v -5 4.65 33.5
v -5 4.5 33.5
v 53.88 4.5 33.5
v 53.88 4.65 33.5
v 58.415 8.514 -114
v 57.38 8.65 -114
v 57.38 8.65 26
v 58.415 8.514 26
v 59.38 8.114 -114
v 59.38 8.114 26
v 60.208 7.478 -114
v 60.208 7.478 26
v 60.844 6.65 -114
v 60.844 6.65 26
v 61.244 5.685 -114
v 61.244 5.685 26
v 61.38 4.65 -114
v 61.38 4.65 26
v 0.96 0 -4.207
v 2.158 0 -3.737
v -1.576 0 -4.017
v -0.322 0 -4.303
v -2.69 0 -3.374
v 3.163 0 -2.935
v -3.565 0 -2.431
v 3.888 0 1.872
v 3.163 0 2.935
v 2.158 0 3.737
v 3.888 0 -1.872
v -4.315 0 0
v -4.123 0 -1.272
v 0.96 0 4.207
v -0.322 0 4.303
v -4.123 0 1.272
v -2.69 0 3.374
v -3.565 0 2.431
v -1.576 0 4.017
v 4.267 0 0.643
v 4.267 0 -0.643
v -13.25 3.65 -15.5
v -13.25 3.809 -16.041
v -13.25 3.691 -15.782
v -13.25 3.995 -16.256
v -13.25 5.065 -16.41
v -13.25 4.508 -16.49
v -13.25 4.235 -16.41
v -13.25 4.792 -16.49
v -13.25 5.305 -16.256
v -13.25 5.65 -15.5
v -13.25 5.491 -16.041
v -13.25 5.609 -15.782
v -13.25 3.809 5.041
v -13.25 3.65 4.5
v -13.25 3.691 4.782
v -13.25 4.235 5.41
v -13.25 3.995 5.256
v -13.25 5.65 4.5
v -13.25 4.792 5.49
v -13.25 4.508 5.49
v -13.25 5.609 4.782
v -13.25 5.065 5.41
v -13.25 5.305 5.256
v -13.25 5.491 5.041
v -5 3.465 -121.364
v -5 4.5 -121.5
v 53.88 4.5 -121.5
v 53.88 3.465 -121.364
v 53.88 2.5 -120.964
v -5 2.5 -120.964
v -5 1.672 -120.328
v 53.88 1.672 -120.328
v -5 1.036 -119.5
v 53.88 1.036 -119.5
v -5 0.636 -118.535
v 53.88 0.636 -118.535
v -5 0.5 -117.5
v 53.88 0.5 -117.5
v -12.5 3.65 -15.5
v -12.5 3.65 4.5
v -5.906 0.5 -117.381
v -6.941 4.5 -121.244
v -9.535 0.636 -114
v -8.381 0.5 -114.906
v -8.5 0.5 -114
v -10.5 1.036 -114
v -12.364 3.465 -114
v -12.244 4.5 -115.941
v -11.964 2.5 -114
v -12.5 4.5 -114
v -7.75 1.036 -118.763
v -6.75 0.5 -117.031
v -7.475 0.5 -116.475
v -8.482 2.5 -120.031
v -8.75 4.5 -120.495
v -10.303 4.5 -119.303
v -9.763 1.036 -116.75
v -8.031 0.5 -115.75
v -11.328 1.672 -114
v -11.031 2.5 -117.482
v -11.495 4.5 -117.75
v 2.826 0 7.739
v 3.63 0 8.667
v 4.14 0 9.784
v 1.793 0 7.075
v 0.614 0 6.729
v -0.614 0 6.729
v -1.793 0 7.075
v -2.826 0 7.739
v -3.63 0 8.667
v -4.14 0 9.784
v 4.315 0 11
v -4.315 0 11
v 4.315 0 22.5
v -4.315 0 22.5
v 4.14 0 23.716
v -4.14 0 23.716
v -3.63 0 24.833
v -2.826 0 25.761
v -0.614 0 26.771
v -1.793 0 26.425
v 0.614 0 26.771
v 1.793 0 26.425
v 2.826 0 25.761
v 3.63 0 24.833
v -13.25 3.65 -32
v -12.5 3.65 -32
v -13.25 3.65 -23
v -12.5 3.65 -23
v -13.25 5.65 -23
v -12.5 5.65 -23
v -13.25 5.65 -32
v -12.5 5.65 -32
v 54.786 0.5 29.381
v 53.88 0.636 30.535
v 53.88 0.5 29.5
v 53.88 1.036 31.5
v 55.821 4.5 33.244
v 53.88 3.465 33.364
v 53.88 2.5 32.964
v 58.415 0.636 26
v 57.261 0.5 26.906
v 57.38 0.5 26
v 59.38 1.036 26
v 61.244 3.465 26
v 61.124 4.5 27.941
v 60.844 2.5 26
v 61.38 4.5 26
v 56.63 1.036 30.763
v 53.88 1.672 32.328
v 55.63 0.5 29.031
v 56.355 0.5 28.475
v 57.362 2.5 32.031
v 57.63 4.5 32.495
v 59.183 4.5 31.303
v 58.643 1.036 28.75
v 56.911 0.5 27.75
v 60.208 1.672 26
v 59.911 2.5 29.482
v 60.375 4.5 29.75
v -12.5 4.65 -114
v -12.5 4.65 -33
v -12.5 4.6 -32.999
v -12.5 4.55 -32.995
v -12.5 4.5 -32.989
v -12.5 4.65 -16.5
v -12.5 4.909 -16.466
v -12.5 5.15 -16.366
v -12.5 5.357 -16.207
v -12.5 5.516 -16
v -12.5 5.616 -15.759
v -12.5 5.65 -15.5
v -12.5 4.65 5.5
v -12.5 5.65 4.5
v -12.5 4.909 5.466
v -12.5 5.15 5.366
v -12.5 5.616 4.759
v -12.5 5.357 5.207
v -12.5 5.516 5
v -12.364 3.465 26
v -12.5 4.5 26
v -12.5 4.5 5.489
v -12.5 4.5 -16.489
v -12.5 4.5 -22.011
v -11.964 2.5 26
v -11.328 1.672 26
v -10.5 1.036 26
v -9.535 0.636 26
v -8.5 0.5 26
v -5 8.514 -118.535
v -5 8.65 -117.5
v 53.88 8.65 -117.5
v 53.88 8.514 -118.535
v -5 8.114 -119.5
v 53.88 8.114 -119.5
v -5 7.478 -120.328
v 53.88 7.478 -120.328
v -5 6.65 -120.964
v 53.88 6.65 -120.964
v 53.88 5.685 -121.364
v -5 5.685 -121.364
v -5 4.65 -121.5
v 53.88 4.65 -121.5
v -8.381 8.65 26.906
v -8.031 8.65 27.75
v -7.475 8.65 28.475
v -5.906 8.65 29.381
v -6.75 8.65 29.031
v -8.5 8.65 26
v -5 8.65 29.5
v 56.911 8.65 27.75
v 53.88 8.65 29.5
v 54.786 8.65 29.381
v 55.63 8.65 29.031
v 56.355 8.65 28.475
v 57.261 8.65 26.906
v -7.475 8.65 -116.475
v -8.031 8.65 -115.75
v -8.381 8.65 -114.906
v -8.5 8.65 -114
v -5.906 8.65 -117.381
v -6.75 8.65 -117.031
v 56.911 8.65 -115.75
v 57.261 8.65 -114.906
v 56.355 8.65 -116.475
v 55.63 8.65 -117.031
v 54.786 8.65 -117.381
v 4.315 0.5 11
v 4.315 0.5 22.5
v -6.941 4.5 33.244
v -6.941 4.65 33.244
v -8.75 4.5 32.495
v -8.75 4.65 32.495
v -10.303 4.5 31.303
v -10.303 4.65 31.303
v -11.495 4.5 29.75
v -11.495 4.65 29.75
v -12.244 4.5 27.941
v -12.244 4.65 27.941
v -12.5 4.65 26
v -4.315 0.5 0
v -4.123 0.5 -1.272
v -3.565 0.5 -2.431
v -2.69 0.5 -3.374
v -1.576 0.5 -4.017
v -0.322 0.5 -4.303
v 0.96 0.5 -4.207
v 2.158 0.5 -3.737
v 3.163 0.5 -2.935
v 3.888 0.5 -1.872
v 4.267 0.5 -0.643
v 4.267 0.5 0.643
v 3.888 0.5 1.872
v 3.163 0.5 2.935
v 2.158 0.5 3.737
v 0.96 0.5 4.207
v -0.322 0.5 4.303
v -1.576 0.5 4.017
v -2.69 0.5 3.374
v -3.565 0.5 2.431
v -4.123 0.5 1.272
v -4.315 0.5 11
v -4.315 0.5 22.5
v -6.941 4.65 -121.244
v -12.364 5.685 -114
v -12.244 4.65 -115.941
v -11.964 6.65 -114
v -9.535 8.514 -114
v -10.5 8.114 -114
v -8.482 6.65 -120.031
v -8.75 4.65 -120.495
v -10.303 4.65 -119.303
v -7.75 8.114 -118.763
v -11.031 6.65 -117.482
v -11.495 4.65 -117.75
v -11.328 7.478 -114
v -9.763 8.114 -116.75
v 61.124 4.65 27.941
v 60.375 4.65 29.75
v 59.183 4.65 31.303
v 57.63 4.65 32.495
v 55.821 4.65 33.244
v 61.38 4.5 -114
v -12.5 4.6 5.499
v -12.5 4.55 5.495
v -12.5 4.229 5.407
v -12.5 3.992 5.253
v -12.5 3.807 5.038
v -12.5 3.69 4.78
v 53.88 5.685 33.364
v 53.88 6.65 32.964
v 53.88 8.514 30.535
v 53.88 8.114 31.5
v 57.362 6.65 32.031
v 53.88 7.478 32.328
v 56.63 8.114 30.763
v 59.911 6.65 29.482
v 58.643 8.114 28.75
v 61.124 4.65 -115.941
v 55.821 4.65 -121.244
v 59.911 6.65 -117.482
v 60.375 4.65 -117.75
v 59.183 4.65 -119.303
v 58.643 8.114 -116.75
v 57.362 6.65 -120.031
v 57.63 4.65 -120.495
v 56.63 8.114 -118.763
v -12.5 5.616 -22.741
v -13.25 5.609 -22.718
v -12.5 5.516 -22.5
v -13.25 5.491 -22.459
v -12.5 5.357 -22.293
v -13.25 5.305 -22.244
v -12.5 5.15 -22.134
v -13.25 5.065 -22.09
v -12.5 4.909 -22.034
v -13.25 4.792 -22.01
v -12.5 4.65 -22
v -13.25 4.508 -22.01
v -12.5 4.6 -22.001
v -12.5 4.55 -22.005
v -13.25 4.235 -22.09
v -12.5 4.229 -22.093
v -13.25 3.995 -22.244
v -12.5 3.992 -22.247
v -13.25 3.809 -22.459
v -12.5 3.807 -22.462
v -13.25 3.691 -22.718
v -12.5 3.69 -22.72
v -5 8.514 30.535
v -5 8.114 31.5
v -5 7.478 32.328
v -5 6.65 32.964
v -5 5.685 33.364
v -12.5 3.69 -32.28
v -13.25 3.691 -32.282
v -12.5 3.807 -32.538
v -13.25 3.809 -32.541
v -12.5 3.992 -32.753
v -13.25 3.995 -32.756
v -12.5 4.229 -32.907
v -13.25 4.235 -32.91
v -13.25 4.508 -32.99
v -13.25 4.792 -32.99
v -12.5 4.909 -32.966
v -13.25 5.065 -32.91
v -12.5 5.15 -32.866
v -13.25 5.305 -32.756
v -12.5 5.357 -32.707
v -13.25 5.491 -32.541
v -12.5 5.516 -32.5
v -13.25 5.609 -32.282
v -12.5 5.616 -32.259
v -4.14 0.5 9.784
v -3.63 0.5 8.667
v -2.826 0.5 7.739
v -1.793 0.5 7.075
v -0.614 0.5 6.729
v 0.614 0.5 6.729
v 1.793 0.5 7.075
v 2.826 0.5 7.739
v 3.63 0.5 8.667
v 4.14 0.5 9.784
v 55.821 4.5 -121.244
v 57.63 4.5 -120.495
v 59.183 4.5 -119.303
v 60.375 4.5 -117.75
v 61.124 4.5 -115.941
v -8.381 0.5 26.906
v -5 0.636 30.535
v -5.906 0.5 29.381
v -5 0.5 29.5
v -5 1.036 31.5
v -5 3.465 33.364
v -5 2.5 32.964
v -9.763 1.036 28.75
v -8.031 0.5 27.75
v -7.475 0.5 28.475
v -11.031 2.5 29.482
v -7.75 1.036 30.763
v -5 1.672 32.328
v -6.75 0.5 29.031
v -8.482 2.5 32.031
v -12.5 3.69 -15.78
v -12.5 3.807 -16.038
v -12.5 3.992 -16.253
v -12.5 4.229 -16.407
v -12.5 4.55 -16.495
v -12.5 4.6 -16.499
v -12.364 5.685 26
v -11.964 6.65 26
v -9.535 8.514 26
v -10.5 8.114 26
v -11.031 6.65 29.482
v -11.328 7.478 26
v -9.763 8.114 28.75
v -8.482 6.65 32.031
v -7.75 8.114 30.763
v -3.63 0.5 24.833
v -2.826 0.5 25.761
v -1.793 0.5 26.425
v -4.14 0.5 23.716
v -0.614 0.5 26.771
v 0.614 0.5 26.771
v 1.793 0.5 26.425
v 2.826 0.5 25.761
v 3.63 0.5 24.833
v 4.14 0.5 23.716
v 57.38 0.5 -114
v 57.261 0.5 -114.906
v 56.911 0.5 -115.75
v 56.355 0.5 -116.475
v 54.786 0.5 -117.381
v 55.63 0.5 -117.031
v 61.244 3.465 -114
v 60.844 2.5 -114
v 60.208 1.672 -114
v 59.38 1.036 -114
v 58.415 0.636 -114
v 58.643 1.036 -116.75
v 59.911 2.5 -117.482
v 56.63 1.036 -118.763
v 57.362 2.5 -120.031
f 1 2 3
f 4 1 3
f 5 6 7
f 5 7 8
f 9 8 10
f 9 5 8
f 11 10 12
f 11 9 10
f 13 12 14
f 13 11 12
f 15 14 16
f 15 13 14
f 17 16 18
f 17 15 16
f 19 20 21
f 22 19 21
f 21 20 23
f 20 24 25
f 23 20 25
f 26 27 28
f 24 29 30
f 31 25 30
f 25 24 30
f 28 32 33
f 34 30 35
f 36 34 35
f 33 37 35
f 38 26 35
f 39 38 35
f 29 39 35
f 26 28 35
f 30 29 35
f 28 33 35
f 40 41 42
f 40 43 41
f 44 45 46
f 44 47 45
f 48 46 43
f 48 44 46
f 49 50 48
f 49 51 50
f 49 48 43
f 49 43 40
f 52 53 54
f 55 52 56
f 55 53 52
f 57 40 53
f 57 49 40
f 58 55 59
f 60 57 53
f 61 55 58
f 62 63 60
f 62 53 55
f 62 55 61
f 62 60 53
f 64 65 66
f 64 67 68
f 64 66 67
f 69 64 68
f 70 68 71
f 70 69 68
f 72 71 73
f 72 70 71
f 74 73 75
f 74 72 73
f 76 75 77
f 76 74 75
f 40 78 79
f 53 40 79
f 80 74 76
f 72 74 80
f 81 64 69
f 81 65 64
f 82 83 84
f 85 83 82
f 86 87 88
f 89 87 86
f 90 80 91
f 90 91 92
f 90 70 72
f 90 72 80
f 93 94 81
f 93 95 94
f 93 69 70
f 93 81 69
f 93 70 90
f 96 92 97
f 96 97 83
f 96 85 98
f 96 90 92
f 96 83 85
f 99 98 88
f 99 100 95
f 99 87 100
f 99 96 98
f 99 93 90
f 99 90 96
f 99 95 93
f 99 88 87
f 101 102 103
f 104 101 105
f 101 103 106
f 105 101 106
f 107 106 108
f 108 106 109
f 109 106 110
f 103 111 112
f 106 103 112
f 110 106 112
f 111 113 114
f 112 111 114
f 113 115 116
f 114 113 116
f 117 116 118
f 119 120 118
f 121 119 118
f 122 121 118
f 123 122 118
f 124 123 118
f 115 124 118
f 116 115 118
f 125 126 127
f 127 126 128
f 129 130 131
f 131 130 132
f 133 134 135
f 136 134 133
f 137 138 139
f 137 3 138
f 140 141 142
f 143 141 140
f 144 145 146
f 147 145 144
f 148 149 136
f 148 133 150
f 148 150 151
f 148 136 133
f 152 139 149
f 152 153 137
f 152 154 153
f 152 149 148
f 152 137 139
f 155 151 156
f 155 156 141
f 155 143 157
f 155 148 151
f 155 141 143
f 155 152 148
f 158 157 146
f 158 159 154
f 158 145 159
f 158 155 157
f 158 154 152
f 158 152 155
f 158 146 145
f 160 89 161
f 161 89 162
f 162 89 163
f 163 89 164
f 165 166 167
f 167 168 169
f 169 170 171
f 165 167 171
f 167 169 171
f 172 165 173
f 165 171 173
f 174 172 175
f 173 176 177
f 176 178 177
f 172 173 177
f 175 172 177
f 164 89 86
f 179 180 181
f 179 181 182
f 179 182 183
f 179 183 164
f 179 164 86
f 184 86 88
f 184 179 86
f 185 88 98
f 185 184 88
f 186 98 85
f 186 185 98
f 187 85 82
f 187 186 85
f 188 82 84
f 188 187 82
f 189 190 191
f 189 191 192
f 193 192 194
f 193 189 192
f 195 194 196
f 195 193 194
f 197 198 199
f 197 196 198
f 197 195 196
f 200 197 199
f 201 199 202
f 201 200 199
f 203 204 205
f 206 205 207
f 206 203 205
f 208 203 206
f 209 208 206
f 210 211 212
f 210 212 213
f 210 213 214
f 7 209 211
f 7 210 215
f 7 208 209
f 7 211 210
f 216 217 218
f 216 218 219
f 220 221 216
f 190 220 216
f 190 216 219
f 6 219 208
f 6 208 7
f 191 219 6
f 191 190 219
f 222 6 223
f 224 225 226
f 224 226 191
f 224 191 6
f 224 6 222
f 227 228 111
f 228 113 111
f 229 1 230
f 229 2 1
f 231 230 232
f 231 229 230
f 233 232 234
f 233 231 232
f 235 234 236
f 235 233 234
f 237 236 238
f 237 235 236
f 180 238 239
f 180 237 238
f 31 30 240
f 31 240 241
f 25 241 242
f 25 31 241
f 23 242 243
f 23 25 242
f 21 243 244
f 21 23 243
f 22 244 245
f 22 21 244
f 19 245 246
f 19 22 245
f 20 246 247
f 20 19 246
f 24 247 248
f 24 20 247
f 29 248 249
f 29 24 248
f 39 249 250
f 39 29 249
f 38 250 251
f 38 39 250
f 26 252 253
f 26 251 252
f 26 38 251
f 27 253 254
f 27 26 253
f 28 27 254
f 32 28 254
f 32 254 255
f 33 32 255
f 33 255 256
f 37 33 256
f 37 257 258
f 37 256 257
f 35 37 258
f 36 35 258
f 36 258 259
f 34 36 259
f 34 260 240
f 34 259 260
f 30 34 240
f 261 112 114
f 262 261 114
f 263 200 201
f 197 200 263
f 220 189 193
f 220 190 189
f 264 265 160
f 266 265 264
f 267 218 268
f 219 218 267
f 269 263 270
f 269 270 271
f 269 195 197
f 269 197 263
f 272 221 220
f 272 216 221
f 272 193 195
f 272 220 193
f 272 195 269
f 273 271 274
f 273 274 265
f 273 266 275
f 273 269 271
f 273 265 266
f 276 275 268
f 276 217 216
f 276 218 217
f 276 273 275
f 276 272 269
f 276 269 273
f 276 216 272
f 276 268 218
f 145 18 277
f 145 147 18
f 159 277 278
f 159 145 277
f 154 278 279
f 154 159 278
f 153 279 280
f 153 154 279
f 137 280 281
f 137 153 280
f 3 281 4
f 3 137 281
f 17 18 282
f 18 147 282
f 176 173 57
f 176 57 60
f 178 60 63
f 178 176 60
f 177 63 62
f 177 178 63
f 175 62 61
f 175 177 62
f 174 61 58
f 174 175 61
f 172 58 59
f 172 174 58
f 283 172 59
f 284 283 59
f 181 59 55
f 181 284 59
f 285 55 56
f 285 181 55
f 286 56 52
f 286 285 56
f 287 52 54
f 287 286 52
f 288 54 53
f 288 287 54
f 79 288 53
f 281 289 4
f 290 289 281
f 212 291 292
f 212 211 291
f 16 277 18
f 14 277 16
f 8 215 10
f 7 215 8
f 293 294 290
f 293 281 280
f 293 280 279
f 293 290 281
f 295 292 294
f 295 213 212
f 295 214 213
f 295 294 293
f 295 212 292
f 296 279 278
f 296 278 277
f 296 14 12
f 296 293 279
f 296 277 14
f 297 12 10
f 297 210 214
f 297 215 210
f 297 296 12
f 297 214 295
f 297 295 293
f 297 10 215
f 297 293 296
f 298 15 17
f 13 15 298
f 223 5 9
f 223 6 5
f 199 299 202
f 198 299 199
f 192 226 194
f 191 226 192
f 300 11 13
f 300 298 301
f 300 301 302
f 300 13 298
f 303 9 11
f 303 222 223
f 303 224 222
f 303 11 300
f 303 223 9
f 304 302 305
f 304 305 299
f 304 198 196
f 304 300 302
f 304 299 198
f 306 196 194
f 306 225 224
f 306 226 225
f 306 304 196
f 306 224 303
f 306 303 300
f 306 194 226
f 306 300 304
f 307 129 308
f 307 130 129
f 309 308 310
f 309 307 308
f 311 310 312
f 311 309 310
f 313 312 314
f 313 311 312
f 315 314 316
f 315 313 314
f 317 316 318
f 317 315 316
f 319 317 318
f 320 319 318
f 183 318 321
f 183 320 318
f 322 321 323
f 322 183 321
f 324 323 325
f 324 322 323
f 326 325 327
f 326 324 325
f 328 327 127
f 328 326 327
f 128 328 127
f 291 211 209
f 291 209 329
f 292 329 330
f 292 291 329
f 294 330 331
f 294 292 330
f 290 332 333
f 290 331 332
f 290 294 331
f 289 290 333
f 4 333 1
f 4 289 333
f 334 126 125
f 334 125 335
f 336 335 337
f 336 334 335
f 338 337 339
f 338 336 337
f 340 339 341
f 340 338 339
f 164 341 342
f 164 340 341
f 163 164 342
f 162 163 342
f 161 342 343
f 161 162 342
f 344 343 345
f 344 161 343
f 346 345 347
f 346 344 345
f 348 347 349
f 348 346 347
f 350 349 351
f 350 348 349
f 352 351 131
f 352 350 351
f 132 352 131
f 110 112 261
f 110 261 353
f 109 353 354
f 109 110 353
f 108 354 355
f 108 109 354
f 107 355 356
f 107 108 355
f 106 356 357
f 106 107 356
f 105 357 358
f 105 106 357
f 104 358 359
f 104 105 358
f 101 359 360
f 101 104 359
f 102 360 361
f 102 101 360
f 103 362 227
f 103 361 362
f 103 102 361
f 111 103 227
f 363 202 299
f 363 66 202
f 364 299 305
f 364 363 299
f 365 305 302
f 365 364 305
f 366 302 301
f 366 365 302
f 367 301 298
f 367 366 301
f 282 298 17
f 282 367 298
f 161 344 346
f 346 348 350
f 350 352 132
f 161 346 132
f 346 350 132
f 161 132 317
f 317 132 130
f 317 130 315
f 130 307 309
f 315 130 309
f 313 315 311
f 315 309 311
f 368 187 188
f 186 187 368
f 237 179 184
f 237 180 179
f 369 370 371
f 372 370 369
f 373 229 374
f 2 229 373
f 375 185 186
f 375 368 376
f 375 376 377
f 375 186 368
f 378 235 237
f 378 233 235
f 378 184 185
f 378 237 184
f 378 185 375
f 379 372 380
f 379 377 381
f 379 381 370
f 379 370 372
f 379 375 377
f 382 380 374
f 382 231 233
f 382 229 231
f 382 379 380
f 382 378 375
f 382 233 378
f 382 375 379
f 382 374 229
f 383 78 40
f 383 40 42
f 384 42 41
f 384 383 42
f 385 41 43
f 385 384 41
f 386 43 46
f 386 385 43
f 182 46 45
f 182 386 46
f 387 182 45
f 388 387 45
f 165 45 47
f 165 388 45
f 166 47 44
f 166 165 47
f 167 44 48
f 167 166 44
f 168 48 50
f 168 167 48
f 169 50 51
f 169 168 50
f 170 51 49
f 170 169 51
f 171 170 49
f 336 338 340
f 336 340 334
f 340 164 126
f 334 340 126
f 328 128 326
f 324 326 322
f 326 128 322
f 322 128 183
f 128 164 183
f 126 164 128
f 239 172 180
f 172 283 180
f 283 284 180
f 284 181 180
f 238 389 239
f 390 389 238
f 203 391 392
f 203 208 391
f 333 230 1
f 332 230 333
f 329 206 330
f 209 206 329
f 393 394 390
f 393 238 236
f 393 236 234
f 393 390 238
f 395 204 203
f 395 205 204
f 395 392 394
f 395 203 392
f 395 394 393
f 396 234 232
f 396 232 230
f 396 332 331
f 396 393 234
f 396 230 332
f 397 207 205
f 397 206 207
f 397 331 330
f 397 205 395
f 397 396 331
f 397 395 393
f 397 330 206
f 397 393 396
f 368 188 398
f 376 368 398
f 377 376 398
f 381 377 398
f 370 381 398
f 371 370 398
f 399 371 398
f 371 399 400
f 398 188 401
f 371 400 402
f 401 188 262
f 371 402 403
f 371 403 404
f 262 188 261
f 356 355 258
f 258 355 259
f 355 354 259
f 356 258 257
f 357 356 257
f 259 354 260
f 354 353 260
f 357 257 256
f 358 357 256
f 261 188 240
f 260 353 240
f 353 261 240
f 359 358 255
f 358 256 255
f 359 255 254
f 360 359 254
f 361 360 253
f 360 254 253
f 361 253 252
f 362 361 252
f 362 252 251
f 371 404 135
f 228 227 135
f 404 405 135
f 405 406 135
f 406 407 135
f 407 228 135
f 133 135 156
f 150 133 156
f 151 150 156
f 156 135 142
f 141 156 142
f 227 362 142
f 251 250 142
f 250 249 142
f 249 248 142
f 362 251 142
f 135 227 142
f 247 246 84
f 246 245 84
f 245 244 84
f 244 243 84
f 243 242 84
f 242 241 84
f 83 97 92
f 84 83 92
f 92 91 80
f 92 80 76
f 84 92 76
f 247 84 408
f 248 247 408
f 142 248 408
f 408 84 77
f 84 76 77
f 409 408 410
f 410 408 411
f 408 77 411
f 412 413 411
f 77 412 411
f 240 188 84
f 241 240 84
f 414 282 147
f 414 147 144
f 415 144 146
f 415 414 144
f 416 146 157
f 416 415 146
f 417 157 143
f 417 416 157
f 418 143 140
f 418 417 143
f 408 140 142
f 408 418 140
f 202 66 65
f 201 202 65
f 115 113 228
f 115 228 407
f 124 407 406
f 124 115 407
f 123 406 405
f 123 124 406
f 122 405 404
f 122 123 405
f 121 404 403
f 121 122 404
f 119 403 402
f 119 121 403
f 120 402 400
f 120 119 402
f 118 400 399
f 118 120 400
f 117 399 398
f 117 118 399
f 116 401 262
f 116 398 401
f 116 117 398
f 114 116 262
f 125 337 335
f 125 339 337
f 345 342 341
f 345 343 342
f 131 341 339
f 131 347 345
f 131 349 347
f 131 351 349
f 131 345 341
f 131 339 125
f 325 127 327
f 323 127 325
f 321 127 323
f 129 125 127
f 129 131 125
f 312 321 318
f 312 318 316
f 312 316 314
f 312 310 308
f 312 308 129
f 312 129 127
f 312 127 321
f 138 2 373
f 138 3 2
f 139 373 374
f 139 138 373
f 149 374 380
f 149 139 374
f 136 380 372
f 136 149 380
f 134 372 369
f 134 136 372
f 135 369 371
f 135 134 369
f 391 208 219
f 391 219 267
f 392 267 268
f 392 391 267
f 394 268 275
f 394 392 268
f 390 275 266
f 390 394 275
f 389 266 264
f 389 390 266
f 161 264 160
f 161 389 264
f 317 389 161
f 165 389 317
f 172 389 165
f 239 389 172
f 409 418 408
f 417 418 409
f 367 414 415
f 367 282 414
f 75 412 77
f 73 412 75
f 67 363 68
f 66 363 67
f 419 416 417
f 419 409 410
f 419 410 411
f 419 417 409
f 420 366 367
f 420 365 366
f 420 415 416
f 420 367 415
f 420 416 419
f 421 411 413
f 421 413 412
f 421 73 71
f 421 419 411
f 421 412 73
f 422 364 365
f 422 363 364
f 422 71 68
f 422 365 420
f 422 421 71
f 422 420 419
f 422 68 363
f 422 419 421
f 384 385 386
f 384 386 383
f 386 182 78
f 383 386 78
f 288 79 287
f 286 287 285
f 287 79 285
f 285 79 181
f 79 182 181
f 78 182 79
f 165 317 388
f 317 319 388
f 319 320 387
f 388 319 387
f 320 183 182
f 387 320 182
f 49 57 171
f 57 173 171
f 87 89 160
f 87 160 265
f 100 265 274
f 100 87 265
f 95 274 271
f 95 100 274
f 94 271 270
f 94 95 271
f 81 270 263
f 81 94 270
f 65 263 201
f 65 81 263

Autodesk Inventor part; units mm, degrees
ref_plane "YZ Plane" through (0, 0, 0) normal (1, 0, 0) x (0, 1, 0)
ref_plane "XZ Plane" through (0, 0, 0) normal (0, 1, 0) x (-1, 0, 0)
ref_plane "XY Plane" through (0, 0, 0) normal (0, 0, 1) x (1, 0, 0)
sketch "Sketch1" plane through (0, 0, 0) normal (0, 1, 0) x (-1, 0, 0)
  circle A0 centre (0, 0) radius 4.315
  line L0 (0, 11) -> (0, 22.5) construction
  line L1 (4.315, 11) -> (4.315, 22.5)
  line L2 (-4.315, 22.5) -> (-4.315, 11)
  arc A1 (-4.315, 11) -> (4.315, 11) centre (0, 11) ccw
  arc A2 (4.315, 22.5) -> (-4.315, 22.5) centre (0, 22.5) ccw
  point P0 (0, 16.75)
  dimension "d0" = 8.63
  dimension "d1" = 11.5
  dimension "d2" = 11
extrude "Extrusion1" add sketch "Sketch1" along normal blind 0.5
sketch "Sketch2" plane through (0, 0.5, 0) normal (0, 1, 0) x (1, 0, 0)
  line L0 (-5, -33.5) -> (53.88, -33.5)
  line L1 (61.38, -26) -> (61.38, 114)
  line L2 (53.88, 121.5) -> (-5, 121.5)
  line L3 (-12.5, 114) -> (-12.5, -26)
  circle A0 centre (0, 0) radius 4.315 projected
  line L4 (-4.315, -11) -> (-4.315, -22.5) projected
  arc A1 (4.315, -11) -> (-4.315, -11) centre (0, -11) ccw projected
  line L5 (4.315, -22.5) -> (4.315, -11) projected
  arc A2 (-4.315, -22.5) -> (4.315, -22.5) centre (0, -22.5) ccw projected
  arc A3 (-12.5, -26) -> (-5, -33.5) centre (-5, -26) ccw
  arc A4 (53.88, -33.5) -> (61.38, -26) centre (53.88, -26) ccw
  arc A5 (61.38, 114) -> (53.88, 121.5) centre (53.88, 114) ccw
  arc A6 (-5, 121.5) -> (-12.5, 114) centre (-5, 114) ccw
  point P0 (61.38, 121.5)
  point P1 (-12.5, 121.5)
  dimension "d5" = 73.88
  dimension "d6" = 155
  dimension "d7" = 33.5
  dimension "d8" = 12.5
  dimension "d9" = 7.5
extrude "Extrusion2" add sketch "Sketch2" along normal blind 8.15 contours A3 L3 A6 L2 A5 L1 A4 L0 | A0 | A1 L5 A2 L4
fillet "Fillet1" radius 4 16 edges at (-10.3033, 0.5, -119.3033) (24.44, 0.5, -121.5) (59.1833, 0.5, -119.3033) (61.38, 0.5, -44) (59.1833, 0.5, 31.3033) (24.44, 0.5, 33.5) (-10.3033, 0.5, 31.3033) (-12.5, 0.5, -44) (-10.3033, 8.65, 31.3033) (24.44, 8.65, 33.5) (59.1833, 8.65, 31.3033) (61.38, 8.65, -44) (59.1833, 8.65, -119.3033) (24.44, 8.65, -121.5) (-10.3033, 8.65, -119.3033) (-12.5, 8.65, -44)
sketch "Sketch3" plane through (-12.5, 4.65, -114) normal (-1, 0, 0) x (0, 0, 1)
  line L0 (0, 0) -> (140, 0) projected
  line L1 (118.5, 0) -> (98.5, 0) construction
  line L2 (118.5, 1) -> (98.5, 1)
  line L3 (98.5, -1) -> (118.5, -1)
  arc A0 (118.5, -1) -> (118.5, 1) centre (118.5, 0) ccw
  arc A1 (98.5, 1) -> (98.5, -1) centre (98.5, 0) ccw
  line L4 (82, 0) -> (91, 0) construction
  line L5 (82, -1) -> (91, -1)
  line L6 (91, 1) -> (82, 1)
  arc A2 (82, 1) -> (82, -1) centre (82, 0) ccw
  arc A3 (91, -1) -> (91, 1) centre (91, 0) ccw
  line L7 (147.5, -0.15) -> (147.5, 0) projected
  point P0 (114, -4.65)
  point P1 (108.5, 0)
  point P2 (86.5, 0)
  dimension "d13" = 20
  dimension "d14" = 2
  dimension "d17" = 9
  dimension "d18" = 2
  dimension "d19" = 29
  dimension "d20" = 7.5
extrude "Extrusion3" add sketch "Sketch3" along normal blind 0.75
properties part number "00_Huawei_P20"
